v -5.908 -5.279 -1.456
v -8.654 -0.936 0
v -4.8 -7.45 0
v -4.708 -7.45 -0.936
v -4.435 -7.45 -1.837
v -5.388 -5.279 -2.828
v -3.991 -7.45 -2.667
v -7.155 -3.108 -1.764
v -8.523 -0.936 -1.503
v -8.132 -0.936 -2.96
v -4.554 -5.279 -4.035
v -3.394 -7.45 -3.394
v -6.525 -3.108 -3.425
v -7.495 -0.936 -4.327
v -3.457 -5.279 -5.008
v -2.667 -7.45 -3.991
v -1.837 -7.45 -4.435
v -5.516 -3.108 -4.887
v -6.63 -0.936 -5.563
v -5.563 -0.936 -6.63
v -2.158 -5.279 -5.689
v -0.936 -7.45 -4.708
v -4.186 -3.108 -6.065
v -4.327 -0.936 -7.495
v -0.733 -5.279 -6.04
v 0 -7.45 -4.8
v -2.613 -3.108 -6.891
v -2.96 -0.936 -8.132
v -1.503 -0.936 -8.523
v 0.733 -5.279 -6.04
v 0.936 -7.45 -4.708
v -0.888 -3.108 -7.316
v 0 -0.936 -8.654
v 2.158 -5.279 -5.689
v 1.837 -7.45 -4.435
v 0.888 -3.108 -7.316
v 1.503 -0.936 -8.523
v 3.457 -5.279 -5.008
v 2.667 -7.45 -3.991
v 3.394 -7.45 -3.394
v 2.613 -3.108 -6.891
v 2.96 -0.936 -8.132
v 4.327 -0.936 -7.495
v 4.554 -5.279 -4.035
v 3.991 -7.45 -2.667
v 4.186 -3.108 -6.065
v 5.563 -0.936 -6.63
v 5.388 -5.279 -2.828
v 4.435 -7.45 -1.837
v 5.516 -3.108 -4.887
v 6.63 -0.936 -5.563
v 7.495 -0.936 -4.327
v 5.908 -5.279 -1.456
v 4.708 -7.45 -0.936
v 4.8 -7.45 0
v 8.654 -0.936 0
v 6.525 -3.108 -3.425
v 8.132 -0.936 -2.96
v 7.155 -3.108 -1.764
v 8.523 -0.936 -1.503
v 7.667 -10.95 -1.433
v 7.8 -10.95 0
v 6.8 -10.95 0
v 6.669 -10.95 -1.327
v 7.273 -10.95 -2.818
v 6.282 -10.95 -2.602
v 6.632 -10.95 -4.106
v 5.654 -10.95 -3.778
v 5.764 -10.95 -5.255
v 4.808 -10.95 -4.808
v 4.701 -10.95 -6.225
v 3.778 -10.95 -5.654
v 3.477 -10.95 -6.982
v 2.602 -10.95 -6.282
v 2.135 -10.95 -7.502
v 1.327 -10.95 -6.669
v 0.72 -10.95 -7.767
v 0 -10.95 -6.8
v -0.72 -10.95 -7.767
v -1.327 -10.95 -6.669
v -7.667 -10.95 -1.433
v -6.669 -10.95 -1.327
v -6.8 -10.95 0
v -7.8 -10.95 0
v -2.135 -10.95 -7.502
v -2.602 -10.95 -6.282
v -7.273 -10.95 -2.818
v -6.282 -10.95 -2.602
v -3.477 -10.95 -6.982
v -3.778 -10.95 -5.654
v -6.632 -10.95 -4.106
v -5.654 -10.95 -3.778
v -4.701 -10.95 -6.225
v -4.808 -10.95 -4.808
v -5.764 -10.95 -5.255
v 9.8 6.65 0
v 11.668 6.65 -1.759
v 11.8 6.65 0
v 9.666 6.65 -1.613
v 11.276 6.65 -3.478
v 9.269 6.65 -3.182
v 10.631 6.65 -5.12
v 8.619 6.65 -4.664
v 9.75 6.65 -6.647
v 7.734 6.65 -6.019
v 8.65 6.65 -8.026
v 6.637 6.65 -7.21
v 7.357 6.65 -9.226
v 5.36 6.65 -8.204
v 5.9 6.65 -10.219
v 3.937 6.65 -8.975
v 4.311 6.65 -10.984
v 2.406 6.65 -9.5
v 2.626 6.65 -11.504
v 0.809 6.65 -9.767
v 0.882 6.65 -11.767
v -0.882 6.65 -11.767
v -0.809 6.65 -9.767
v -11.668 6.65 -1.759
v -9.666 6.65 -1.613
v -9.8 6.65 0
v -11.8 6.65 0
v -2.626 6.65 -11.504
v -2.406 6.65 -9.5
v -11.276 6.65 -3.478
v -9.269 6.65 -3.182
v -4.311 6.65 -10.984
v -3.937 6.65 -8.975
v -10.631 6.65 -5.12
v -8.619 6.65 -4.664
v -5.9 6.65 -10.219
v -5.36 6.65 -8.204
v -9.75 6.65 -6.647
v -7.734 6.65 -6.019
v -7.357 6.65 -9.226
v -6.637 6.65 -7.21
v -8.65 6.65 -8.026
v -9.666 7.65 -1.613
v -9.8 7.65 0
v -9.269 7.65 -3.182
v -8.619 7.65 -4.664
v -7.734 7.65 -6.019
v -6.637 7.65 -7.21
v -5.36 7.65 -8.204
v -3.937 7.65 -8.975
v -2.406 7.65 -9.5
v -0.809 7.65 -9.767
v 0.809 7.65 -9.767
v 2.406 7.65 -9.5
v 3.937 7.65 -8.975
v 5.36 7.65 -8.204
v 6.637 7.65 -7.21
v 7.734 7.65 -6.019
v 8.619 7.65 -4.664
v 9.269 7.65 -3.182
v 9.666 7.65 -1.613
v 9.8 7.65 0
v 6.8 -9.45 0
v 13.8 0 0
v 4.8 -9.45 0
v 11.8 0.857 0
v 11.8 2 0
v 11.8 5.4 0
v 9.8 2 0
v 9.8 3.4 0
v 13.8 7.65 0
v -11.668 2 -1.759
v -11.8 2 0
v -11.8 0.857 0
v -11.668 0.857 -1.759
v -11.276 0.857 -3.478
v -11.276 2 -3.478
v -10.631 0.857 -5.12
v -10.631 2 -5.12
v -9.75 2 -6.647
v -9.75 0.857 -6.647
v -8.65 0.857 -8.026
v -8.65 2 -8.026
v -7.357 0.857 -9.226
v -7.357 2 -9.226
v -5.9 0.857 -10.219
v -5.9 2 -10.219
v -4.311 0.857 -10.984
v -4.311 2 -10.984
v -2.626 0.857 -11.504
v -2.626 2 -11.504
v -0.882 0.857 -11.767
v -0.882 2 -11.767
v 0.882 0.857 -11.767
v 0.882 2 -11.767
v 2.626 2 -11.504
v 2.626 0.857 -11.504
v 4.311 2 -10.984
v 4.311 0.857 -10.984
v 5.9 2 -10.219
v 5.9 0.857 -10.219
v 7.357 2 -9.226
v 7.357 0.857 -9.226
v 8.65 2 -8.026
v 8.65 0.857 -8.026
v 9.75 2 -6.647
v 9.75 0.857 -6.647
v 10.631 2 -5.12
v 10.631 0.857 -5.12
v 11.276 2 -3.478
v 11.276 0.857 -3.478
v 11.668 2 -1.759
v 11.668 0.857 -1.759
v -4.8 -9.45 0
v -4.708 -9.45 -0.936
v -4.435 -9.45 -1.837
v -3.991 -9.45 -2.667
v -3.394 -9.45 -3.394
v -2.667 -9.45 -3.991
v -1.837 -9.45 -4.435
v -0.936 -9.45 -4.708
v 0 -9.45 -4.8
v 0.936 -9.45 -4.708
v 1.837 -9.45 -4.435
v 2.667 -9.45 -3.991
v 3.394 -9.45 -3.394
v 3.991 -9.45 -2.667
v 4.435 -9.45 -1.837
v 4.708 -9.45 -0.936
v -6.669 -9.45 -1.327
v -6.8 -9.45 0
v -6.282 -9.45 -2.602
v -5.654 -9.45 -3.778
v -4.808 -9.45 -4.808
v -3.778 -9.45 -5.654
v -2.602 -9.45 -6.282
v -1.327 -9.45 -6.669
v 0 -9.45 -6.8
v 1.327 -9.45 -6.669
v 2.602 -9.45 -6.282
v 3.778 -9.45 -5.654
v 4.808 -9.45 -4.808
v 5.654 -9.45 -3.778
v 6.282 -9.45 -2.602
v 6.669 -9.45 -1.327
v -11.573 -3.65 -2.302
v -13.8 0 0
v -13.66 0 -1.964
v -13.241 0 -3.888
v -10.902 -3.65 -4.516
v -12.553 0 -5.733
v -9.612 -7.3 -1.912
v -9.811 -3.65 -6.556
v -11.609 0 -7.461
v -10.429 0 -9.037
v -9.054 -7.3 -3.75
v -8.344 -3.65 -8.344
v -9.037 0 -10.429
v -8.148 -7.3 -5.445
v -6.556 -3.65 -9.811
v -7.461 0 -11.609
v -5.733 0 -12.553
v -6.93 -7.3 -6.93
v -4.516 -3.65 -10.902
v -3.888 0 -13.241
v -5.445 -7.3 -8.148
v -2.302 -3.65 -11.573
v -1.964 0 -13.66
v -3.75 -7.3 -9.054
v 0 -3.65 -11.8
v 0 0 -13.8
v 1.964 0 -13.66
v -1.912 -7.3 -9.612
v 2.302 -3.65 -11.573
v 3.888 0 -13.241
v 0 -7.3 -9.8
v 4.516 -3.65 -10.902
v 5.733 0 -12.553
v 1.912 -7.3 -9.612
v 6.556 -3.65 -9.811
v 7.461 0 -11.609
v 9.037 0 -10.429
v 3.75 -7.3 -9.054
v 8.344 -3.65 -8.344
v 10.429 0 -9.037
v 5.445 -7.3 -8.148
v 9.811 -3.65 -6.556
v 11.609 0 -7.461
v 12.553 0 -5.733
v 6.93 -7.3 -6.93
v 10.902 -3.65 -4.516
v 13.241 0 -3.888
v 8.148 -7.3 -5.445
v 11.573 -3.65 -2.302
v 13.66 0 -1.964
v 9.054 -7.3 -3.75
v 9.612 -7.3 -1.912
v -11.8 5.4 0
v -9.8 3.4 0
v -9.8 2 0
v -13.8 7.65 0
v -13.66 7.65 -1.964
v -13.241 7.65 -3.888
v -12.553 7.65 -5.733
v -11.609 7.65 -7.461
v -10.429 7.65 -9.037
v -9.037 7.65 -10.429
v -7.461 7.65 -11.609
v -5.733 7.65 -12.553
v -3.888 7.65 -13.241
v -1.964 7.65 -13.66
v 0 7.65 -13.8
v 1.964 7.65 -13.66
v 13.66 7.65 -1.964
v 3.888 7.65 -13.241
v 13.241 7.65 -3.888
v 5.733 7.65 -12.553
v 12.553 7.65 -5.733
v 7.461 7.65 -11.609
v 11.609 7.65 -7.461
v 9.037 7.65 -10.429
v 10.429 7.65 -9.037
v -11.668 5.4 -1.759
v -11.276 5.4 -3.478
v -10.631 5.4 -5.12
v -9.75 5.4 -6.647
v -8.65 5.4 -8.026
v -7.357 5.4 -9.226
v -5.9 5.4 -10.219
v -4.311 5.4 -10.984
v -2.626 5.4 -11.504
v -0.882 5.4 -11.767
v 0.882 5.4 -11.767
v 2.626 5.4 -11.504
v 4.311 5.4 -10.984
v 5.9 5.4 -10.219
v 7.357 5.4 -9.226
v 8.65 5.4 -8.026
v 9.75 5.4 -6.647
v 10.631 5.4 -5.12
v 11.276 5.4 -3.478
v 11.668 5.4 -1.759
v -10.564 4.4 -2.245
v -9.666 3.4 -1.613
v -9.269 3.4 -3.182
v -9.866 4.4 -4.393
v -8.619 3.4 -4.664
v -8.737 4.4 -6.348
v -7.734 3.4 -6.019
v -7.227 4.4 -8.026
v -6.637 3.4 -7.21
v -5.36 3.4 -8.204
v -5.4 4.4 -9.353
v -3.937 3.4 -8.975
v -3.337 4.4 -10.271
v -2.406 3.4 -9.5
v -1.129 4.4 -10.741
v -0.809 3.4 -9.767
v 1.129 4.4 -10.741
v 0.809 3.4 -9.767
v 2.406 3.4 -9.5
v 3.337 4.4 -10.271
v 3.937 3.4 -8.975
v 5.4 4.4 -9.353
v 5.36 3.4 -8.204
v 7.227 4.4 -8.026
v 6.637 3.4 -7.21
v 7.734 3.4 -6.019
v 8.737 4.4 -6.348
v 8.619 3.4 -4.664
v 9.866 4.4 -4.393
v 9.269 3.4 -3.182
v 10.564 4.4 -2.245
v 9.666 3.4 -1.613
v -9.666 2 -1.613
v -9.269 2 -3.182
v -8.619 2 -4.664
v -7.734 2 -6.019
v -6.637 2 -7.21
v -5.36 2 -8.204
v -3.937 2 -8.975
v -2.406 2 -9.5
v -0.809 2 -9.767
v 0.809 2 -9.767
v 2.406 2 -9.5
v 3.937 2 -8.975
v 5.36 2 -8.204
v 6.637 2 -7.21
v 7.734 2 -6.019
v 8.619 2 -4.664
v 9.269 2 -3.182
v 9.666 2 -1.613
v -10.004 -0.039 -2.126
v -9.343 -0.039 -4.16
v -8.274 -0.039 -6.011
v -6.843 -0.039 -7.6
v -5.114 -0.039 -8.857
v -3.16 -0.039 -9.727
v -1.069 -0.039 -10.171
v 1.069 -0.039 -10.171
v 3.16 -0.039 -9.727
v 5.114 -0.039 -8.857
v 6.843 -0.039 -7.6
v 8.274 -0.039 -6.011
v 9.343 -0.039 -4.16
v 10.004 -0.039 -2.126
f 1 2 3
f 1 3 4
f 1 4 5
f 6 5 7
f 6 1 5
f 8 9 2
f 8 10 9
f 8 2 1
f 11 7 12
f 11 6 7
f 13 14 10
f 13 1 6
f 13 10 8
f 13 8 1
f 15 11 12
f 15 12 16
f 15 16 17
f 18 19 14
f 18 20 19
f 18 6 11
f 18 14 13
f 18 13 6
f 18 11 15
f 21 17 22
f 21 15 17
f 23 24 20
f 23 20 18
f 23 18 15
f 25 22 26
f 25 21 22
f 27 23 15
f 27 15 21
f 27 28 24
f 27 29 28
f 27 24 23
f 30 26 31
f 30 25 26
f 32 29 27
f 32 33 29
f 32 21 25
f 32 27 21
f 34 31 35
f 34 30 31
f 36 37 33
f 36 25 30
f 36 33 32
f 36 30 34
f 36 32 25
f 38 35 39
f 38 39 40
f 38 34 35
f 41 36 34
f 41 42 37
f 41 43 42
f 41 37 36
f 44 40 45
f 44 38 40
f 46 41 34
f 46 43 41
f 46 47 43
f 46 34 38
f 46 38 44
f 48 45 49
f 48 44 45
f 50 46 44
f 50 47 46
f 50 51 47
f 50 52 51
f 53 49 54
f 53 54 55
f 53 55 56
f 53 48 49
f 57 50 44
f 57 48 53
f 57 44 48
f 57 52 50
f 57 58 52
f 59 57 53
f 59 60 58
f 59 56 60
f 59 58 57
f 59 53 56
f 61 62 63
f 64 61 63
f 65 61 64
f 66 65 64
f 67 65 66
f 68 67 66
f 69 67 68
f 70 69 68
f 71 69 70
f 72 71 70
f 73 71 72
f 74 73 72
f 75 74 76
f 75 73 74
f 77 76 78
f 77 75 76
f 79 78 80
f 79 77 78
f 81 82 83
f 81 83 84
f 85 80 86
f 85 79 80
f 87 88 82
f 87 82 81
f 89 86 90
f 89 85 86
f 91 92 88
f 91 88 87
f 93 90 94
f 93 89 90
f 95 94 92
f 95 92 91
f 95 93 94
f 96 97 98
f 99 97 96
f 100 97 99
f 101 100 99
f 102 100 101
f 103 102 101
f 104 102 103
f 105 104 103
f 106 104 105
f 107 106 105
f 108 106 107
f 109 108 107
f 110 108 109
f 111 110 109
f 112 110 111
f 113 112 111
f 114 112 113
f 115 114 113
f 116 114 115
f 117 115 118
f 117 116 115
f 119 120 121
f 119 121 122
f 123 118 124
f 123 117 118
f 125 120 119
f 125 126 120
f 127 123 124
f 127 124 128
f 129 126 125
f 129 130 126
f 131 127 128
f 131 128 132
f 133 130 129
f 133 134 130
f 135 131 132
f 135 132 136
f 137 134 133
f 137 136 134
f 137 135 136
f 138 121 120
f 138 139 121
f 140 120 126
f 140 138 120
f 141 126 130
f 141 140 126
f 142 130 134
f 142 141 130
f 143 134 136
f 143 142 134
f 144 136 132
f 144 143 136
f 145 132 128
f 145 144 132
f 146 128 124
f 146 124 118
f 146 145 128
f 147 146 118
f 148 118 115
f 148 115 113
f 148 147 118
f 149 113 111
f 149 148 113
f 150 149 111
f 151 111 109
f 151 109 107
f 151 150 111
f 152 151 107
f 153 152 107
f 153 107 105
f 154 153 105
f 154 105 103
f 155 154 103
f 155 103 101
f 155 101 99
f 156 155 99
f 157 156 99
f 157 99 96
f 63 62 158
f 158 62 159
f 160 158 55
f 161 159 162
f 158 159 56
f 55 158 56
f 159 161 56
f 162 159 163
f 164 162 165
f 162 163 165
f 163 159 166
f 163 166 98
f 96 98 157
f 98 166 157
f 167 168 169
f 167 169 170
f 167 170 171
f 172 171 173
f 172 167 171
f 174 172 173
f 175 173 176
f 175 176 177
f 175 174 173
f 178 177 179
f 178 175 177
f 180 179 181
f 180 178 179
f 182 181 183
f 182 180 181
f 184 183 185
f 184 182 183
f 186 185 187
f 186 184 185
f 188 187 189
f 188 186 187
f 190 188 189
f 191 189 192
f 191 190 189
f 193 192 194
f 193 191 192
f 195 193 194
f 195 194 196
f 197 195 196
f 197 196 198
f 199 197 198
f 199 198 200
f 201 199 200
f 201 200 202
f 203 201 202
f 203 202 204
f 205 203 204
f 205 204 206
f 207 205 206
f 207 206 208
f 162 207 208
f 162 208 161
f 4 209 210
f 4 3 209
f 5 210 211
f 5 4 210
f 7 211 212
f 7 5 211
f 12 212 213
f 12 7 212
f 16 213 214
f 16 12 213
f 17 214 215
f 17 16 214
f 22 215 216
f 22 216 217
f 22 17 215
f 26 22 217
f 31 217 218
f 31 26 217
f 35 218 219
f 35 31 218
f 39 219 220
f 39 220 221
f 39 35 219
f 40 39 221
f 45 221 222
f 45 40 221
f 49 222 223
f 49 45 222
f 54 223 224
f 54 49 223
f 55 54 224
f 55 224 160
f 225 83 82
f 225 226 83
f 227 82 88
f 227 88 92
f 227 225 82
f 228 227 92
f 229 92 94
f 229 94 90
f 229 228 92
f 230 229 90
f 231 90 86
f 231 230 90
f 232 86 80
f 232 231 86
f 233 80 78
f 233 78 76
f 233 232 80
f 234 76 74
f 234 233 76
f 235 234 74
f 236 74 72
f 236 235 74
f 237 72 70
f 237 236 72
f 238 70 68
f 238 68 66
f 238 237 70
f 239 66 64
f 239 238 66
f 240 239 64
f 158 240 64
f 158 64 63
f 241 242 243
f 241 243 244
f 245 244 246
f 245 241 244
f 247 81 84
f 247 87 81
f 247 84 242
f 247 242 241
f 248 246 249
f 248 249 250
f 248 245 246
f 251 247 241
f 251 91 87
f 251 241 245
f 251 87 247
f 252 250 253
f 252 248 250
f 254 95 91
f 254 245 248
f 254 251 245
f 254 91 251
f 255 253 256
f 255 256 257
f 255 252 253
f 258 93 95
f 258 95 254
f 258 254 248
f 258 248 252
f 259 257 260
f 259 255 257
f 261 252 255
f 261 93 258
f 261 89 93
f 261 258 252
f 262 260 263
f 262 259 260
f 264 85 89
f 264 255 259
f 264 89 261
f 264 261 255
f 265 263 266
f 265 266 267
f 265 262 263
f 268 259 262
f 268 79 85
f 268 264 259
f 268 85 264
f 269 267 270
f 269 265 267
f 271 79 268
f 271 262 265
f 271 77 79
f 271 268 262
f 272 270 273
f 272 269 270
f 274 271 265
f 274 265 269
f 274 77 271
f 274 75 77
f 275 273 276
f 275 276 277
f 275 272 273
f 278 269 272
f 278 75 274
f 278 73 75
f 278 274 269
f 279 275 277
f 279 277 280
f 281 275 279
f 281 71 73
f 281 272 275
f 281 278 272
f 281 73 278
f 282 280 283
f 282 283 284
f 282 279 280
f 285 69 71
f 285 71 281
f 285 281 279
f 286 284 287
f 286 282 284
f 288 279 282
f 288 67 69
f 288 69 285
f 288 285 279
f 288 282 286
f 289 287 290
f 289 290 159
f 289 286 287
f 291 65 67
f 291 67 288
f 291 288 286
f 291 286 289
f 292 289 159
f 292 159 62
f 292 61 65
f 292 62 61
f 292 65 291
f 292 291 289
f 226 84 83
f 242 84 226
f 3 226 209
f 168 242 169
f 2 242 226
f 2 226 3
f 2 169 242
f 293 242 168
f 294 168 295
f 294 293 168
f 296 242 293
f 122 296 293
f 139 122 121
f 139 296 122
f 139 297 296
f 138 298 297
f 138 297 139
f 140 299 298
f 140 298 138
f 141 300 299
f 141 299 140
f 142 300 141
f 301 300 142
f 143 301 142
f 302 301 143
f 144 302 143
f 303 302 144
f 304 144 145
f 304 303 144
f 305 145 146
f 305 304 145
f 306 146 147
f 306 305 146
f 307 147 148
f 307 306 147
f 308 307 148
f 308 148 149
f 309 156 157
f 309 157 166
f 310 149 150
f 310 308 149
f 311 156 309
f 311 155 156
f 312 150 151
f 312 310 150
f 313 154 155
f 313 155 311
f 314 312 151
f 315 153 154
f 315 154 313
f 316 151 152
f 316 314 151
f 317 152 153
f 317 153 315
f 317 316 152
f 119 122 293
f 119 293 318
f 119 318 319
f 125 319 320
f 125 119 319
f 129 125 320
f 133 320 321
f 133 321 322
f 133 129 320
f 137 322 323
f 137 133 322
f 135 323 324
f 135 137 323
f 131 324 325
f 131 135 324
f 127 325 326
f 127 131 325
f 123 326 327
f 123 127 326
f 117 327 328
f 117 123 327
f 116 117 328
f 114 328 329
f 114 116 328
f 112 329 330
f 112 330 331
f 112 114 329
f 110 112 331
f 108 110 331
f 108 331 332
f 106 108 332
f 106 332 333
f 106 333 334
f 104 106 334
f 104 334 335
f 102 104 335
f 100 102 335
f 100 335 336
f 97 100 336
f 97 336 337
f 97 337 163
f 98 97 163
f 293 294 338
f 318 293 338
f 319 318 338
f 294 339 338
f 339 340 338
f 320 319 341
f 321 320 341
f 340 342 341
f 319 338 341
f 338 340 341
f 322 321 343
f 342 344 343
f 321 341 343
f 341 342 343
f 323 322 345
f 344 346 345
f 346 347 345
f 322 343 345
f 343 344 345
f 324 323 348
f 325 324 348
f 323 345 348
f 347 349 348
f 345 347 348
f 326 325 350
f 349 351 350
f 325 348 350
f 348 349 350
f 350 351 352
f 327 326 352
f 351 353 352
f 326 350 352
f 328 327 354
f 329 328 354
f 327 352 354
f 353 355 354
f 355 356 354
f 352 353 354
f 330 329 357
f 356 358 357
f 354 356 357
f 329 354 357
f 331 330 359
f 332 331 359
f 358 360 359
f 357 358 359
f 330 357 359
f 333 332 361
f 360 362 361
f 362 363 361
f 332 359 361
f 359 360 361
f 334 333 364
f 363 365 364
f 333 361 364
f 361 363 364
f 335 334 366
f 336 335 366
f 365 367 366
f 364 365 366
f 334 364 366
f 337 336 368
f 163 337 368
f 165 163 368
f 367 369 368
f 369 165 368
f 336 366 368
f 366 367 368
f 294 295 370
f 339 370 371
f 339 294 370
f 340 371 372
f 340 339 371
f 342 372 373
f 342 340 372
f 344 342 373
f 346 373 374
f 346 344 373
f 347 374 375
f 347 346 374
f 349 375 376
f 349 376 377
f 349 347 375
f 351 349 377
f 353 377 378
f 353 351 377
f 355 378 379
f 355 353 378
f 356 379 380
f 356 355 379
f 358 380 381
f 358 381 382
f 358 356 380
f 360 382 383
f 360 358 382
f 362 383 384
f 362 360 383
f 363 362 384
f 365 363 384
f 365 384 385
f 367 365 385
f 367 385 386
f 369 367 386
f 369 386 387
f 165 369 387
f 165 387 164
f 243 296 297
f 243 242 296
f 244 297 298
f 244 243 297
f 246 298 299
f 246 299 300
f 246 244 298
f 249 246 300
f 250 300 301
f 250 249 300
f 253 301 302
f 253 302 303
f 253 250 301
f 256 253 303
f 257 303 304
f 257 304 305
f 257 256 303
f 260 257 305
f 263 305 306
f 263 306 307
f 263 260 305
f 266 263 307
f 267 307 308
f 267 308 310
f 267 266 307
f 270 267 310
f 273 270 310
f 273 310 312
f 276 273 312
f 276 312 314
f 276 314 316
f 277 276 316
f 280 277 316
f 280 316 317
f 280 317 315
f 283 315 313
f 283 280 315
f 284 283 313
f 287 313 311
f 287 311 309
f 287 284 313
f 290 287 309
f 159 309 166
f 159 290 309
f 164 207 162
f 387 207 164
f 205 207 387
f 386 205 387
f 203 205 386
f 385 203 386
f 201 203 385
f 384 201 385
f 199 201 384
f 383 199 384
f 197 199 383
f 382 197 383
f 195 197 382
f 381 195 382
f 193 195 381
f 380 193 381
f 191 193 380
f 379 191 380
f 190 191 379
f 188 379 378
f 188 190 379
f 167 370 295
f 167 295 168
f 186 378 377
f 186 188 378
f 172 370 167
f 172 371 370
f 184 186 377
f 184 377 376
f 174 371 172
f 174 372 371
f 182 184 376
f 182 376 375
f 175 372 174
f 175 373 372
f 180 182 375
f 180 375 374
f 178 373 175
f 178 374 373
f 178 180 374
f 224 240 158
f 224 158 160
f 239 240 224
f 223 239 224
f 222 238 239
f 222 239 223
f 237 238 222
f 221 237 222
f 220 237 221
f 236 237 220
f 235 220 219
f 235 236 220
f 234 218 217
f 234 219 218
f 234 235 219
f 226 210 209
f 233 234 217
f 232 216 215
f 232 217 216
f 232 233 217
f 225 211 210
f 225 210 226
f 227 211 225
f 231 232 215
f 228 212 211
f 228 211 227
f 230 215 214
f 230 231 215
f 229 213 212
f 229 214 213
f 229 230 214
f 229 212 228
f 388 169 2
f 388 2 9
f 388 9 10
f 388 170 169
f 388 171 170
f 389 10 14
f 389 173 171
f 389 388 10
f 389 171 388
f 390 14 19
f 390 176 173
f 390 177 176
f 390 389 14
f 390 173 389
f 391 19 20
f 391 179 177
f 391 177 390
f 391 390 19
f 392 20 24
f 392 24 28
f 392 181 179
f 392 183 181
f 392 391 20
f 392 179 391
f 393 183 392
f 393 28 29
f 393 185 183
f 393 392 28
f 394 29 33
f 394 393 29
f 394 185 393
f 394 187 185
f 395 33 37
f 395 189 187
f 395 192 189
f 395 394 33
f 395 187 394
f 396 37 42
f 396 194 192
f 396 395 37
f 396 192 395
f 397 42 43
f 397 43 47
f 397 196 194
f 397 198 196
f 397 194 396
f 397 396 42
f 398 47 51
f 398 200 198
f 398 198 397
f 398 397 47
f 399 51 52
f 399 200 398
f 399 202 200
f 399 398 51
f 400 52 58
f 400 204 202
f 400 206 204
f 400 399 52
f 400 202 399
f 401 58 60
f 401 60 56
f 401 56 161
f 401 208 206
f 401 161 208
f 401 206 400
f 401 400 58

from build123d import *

# Parameters (mm, degrees)
F1_ANGLE    = 180
F2_T4_ANGLE = 248.1806251609
F2_S5_R     = 11.8
F2_T6_DEPTH = 17
F3_T4_ANGLE = 247.7679532438
F3_S5_R     = 11.8
F3_T6_DEPTH = 17


# Not quite as in the source:
# - a fillet or chamfer that OpenCascade refuses, or shapes differently, is made with other operations: its cross-section is extruded or revolved along the edge and cut away or added


with BuildPart() as f1:
    # F0 (on Top) → F1 (revolve)
    with BuildSketch(Plane.XY):
        Polygon((-11.8, 5.65), (-11.8, 6.65), (-13.8, 6.65), (-13.8, 0), (-7.8, -10.95), (-6.8, -10.95), (-6.8, -9.45), (-4.8, -9.45), (-4.8, -7.45), (-9.8, 1), (-11.8, 1), (-11.8, 2), (-9.8, 2), (-9.8, 5.65), align=None)
        Polygon((-13.8, 6.65), (-11.8, 6.65), (-9.8, 6.65), (-9.8, 7.65), (-13.8, 7.65), align=None)
    revolve(axis=Axis((0, 0, 0), (0, -1, 0)), revolution_arc=F1_ANGLE)

    # F2: chamfer of 2.25 on 1 edges, made by hand


with BuildPart() as f2_tool2:
    # F2_s3 → F2_t4 (revolve)
    with BuildSketch(Plane(origin=(0, 0, 0), x_dir=(0, 1, 0), z_dir=(0.5604989803, 0, 0.8281551142))):
        Polygon((-0.9364000214, 8.6542011708), (1, 12.05), (1, 9.8), align=None)
    revolve(axis=Axis((0, 1, 0), (0, -1, 0)), revolution_arc=F2_T4_ANGLE)

    # F2_s5 → F2_t6 (intersect, symmetric)
    with BuildSketch(Plane.XZ):
        Circle(F2_S5_R)
    extrude(amount=F2_T6_DEPTH, both=True, mode=Mode.INTERSECT)


with BuildPart() as f1_1:
    add(f1.part)

    # F2_t1: cut F2_tool2
    add(f2_tool2.part, mode=Mode.SUBTRACT)

    # F3: chamfer of 2.25 on 1 edges, made by hand


with BuildPart() as f3_tool2:
    # F3_s3 → F3_t4 (revolve)
    with BuildSketch(Plane(origin=(0, 0, 0), x_dir=(0, 1, 0), z_dir=(0.5575129654, 0, 0.830168232))):
        Polygon((5.65, 12.05), (3.4, 9.8), (5.65, 9.8), align=None)
    revolve(axis=Axis((0, 5.65, 0), (0, -1, 0)), revolution_arc=F3_T4_ANGLE)

    # F3_s5 → F3_t6 (intersect, symmetric)
    with BuildSketch(Plane.XZ.offset(-4.5)):
        Circle(F3_S5_R)
    extrude(amount=F3_T6_DEPTH, both=True, mode=Mode.INTERSECT)


with BuildPart() as f1_2:
    add(f1_1.part)

    # F3_t1: cut F3_tool2
    add(f3_tool2.part, mode=Mode.SUBTRACT)


solid = f1_2.part
